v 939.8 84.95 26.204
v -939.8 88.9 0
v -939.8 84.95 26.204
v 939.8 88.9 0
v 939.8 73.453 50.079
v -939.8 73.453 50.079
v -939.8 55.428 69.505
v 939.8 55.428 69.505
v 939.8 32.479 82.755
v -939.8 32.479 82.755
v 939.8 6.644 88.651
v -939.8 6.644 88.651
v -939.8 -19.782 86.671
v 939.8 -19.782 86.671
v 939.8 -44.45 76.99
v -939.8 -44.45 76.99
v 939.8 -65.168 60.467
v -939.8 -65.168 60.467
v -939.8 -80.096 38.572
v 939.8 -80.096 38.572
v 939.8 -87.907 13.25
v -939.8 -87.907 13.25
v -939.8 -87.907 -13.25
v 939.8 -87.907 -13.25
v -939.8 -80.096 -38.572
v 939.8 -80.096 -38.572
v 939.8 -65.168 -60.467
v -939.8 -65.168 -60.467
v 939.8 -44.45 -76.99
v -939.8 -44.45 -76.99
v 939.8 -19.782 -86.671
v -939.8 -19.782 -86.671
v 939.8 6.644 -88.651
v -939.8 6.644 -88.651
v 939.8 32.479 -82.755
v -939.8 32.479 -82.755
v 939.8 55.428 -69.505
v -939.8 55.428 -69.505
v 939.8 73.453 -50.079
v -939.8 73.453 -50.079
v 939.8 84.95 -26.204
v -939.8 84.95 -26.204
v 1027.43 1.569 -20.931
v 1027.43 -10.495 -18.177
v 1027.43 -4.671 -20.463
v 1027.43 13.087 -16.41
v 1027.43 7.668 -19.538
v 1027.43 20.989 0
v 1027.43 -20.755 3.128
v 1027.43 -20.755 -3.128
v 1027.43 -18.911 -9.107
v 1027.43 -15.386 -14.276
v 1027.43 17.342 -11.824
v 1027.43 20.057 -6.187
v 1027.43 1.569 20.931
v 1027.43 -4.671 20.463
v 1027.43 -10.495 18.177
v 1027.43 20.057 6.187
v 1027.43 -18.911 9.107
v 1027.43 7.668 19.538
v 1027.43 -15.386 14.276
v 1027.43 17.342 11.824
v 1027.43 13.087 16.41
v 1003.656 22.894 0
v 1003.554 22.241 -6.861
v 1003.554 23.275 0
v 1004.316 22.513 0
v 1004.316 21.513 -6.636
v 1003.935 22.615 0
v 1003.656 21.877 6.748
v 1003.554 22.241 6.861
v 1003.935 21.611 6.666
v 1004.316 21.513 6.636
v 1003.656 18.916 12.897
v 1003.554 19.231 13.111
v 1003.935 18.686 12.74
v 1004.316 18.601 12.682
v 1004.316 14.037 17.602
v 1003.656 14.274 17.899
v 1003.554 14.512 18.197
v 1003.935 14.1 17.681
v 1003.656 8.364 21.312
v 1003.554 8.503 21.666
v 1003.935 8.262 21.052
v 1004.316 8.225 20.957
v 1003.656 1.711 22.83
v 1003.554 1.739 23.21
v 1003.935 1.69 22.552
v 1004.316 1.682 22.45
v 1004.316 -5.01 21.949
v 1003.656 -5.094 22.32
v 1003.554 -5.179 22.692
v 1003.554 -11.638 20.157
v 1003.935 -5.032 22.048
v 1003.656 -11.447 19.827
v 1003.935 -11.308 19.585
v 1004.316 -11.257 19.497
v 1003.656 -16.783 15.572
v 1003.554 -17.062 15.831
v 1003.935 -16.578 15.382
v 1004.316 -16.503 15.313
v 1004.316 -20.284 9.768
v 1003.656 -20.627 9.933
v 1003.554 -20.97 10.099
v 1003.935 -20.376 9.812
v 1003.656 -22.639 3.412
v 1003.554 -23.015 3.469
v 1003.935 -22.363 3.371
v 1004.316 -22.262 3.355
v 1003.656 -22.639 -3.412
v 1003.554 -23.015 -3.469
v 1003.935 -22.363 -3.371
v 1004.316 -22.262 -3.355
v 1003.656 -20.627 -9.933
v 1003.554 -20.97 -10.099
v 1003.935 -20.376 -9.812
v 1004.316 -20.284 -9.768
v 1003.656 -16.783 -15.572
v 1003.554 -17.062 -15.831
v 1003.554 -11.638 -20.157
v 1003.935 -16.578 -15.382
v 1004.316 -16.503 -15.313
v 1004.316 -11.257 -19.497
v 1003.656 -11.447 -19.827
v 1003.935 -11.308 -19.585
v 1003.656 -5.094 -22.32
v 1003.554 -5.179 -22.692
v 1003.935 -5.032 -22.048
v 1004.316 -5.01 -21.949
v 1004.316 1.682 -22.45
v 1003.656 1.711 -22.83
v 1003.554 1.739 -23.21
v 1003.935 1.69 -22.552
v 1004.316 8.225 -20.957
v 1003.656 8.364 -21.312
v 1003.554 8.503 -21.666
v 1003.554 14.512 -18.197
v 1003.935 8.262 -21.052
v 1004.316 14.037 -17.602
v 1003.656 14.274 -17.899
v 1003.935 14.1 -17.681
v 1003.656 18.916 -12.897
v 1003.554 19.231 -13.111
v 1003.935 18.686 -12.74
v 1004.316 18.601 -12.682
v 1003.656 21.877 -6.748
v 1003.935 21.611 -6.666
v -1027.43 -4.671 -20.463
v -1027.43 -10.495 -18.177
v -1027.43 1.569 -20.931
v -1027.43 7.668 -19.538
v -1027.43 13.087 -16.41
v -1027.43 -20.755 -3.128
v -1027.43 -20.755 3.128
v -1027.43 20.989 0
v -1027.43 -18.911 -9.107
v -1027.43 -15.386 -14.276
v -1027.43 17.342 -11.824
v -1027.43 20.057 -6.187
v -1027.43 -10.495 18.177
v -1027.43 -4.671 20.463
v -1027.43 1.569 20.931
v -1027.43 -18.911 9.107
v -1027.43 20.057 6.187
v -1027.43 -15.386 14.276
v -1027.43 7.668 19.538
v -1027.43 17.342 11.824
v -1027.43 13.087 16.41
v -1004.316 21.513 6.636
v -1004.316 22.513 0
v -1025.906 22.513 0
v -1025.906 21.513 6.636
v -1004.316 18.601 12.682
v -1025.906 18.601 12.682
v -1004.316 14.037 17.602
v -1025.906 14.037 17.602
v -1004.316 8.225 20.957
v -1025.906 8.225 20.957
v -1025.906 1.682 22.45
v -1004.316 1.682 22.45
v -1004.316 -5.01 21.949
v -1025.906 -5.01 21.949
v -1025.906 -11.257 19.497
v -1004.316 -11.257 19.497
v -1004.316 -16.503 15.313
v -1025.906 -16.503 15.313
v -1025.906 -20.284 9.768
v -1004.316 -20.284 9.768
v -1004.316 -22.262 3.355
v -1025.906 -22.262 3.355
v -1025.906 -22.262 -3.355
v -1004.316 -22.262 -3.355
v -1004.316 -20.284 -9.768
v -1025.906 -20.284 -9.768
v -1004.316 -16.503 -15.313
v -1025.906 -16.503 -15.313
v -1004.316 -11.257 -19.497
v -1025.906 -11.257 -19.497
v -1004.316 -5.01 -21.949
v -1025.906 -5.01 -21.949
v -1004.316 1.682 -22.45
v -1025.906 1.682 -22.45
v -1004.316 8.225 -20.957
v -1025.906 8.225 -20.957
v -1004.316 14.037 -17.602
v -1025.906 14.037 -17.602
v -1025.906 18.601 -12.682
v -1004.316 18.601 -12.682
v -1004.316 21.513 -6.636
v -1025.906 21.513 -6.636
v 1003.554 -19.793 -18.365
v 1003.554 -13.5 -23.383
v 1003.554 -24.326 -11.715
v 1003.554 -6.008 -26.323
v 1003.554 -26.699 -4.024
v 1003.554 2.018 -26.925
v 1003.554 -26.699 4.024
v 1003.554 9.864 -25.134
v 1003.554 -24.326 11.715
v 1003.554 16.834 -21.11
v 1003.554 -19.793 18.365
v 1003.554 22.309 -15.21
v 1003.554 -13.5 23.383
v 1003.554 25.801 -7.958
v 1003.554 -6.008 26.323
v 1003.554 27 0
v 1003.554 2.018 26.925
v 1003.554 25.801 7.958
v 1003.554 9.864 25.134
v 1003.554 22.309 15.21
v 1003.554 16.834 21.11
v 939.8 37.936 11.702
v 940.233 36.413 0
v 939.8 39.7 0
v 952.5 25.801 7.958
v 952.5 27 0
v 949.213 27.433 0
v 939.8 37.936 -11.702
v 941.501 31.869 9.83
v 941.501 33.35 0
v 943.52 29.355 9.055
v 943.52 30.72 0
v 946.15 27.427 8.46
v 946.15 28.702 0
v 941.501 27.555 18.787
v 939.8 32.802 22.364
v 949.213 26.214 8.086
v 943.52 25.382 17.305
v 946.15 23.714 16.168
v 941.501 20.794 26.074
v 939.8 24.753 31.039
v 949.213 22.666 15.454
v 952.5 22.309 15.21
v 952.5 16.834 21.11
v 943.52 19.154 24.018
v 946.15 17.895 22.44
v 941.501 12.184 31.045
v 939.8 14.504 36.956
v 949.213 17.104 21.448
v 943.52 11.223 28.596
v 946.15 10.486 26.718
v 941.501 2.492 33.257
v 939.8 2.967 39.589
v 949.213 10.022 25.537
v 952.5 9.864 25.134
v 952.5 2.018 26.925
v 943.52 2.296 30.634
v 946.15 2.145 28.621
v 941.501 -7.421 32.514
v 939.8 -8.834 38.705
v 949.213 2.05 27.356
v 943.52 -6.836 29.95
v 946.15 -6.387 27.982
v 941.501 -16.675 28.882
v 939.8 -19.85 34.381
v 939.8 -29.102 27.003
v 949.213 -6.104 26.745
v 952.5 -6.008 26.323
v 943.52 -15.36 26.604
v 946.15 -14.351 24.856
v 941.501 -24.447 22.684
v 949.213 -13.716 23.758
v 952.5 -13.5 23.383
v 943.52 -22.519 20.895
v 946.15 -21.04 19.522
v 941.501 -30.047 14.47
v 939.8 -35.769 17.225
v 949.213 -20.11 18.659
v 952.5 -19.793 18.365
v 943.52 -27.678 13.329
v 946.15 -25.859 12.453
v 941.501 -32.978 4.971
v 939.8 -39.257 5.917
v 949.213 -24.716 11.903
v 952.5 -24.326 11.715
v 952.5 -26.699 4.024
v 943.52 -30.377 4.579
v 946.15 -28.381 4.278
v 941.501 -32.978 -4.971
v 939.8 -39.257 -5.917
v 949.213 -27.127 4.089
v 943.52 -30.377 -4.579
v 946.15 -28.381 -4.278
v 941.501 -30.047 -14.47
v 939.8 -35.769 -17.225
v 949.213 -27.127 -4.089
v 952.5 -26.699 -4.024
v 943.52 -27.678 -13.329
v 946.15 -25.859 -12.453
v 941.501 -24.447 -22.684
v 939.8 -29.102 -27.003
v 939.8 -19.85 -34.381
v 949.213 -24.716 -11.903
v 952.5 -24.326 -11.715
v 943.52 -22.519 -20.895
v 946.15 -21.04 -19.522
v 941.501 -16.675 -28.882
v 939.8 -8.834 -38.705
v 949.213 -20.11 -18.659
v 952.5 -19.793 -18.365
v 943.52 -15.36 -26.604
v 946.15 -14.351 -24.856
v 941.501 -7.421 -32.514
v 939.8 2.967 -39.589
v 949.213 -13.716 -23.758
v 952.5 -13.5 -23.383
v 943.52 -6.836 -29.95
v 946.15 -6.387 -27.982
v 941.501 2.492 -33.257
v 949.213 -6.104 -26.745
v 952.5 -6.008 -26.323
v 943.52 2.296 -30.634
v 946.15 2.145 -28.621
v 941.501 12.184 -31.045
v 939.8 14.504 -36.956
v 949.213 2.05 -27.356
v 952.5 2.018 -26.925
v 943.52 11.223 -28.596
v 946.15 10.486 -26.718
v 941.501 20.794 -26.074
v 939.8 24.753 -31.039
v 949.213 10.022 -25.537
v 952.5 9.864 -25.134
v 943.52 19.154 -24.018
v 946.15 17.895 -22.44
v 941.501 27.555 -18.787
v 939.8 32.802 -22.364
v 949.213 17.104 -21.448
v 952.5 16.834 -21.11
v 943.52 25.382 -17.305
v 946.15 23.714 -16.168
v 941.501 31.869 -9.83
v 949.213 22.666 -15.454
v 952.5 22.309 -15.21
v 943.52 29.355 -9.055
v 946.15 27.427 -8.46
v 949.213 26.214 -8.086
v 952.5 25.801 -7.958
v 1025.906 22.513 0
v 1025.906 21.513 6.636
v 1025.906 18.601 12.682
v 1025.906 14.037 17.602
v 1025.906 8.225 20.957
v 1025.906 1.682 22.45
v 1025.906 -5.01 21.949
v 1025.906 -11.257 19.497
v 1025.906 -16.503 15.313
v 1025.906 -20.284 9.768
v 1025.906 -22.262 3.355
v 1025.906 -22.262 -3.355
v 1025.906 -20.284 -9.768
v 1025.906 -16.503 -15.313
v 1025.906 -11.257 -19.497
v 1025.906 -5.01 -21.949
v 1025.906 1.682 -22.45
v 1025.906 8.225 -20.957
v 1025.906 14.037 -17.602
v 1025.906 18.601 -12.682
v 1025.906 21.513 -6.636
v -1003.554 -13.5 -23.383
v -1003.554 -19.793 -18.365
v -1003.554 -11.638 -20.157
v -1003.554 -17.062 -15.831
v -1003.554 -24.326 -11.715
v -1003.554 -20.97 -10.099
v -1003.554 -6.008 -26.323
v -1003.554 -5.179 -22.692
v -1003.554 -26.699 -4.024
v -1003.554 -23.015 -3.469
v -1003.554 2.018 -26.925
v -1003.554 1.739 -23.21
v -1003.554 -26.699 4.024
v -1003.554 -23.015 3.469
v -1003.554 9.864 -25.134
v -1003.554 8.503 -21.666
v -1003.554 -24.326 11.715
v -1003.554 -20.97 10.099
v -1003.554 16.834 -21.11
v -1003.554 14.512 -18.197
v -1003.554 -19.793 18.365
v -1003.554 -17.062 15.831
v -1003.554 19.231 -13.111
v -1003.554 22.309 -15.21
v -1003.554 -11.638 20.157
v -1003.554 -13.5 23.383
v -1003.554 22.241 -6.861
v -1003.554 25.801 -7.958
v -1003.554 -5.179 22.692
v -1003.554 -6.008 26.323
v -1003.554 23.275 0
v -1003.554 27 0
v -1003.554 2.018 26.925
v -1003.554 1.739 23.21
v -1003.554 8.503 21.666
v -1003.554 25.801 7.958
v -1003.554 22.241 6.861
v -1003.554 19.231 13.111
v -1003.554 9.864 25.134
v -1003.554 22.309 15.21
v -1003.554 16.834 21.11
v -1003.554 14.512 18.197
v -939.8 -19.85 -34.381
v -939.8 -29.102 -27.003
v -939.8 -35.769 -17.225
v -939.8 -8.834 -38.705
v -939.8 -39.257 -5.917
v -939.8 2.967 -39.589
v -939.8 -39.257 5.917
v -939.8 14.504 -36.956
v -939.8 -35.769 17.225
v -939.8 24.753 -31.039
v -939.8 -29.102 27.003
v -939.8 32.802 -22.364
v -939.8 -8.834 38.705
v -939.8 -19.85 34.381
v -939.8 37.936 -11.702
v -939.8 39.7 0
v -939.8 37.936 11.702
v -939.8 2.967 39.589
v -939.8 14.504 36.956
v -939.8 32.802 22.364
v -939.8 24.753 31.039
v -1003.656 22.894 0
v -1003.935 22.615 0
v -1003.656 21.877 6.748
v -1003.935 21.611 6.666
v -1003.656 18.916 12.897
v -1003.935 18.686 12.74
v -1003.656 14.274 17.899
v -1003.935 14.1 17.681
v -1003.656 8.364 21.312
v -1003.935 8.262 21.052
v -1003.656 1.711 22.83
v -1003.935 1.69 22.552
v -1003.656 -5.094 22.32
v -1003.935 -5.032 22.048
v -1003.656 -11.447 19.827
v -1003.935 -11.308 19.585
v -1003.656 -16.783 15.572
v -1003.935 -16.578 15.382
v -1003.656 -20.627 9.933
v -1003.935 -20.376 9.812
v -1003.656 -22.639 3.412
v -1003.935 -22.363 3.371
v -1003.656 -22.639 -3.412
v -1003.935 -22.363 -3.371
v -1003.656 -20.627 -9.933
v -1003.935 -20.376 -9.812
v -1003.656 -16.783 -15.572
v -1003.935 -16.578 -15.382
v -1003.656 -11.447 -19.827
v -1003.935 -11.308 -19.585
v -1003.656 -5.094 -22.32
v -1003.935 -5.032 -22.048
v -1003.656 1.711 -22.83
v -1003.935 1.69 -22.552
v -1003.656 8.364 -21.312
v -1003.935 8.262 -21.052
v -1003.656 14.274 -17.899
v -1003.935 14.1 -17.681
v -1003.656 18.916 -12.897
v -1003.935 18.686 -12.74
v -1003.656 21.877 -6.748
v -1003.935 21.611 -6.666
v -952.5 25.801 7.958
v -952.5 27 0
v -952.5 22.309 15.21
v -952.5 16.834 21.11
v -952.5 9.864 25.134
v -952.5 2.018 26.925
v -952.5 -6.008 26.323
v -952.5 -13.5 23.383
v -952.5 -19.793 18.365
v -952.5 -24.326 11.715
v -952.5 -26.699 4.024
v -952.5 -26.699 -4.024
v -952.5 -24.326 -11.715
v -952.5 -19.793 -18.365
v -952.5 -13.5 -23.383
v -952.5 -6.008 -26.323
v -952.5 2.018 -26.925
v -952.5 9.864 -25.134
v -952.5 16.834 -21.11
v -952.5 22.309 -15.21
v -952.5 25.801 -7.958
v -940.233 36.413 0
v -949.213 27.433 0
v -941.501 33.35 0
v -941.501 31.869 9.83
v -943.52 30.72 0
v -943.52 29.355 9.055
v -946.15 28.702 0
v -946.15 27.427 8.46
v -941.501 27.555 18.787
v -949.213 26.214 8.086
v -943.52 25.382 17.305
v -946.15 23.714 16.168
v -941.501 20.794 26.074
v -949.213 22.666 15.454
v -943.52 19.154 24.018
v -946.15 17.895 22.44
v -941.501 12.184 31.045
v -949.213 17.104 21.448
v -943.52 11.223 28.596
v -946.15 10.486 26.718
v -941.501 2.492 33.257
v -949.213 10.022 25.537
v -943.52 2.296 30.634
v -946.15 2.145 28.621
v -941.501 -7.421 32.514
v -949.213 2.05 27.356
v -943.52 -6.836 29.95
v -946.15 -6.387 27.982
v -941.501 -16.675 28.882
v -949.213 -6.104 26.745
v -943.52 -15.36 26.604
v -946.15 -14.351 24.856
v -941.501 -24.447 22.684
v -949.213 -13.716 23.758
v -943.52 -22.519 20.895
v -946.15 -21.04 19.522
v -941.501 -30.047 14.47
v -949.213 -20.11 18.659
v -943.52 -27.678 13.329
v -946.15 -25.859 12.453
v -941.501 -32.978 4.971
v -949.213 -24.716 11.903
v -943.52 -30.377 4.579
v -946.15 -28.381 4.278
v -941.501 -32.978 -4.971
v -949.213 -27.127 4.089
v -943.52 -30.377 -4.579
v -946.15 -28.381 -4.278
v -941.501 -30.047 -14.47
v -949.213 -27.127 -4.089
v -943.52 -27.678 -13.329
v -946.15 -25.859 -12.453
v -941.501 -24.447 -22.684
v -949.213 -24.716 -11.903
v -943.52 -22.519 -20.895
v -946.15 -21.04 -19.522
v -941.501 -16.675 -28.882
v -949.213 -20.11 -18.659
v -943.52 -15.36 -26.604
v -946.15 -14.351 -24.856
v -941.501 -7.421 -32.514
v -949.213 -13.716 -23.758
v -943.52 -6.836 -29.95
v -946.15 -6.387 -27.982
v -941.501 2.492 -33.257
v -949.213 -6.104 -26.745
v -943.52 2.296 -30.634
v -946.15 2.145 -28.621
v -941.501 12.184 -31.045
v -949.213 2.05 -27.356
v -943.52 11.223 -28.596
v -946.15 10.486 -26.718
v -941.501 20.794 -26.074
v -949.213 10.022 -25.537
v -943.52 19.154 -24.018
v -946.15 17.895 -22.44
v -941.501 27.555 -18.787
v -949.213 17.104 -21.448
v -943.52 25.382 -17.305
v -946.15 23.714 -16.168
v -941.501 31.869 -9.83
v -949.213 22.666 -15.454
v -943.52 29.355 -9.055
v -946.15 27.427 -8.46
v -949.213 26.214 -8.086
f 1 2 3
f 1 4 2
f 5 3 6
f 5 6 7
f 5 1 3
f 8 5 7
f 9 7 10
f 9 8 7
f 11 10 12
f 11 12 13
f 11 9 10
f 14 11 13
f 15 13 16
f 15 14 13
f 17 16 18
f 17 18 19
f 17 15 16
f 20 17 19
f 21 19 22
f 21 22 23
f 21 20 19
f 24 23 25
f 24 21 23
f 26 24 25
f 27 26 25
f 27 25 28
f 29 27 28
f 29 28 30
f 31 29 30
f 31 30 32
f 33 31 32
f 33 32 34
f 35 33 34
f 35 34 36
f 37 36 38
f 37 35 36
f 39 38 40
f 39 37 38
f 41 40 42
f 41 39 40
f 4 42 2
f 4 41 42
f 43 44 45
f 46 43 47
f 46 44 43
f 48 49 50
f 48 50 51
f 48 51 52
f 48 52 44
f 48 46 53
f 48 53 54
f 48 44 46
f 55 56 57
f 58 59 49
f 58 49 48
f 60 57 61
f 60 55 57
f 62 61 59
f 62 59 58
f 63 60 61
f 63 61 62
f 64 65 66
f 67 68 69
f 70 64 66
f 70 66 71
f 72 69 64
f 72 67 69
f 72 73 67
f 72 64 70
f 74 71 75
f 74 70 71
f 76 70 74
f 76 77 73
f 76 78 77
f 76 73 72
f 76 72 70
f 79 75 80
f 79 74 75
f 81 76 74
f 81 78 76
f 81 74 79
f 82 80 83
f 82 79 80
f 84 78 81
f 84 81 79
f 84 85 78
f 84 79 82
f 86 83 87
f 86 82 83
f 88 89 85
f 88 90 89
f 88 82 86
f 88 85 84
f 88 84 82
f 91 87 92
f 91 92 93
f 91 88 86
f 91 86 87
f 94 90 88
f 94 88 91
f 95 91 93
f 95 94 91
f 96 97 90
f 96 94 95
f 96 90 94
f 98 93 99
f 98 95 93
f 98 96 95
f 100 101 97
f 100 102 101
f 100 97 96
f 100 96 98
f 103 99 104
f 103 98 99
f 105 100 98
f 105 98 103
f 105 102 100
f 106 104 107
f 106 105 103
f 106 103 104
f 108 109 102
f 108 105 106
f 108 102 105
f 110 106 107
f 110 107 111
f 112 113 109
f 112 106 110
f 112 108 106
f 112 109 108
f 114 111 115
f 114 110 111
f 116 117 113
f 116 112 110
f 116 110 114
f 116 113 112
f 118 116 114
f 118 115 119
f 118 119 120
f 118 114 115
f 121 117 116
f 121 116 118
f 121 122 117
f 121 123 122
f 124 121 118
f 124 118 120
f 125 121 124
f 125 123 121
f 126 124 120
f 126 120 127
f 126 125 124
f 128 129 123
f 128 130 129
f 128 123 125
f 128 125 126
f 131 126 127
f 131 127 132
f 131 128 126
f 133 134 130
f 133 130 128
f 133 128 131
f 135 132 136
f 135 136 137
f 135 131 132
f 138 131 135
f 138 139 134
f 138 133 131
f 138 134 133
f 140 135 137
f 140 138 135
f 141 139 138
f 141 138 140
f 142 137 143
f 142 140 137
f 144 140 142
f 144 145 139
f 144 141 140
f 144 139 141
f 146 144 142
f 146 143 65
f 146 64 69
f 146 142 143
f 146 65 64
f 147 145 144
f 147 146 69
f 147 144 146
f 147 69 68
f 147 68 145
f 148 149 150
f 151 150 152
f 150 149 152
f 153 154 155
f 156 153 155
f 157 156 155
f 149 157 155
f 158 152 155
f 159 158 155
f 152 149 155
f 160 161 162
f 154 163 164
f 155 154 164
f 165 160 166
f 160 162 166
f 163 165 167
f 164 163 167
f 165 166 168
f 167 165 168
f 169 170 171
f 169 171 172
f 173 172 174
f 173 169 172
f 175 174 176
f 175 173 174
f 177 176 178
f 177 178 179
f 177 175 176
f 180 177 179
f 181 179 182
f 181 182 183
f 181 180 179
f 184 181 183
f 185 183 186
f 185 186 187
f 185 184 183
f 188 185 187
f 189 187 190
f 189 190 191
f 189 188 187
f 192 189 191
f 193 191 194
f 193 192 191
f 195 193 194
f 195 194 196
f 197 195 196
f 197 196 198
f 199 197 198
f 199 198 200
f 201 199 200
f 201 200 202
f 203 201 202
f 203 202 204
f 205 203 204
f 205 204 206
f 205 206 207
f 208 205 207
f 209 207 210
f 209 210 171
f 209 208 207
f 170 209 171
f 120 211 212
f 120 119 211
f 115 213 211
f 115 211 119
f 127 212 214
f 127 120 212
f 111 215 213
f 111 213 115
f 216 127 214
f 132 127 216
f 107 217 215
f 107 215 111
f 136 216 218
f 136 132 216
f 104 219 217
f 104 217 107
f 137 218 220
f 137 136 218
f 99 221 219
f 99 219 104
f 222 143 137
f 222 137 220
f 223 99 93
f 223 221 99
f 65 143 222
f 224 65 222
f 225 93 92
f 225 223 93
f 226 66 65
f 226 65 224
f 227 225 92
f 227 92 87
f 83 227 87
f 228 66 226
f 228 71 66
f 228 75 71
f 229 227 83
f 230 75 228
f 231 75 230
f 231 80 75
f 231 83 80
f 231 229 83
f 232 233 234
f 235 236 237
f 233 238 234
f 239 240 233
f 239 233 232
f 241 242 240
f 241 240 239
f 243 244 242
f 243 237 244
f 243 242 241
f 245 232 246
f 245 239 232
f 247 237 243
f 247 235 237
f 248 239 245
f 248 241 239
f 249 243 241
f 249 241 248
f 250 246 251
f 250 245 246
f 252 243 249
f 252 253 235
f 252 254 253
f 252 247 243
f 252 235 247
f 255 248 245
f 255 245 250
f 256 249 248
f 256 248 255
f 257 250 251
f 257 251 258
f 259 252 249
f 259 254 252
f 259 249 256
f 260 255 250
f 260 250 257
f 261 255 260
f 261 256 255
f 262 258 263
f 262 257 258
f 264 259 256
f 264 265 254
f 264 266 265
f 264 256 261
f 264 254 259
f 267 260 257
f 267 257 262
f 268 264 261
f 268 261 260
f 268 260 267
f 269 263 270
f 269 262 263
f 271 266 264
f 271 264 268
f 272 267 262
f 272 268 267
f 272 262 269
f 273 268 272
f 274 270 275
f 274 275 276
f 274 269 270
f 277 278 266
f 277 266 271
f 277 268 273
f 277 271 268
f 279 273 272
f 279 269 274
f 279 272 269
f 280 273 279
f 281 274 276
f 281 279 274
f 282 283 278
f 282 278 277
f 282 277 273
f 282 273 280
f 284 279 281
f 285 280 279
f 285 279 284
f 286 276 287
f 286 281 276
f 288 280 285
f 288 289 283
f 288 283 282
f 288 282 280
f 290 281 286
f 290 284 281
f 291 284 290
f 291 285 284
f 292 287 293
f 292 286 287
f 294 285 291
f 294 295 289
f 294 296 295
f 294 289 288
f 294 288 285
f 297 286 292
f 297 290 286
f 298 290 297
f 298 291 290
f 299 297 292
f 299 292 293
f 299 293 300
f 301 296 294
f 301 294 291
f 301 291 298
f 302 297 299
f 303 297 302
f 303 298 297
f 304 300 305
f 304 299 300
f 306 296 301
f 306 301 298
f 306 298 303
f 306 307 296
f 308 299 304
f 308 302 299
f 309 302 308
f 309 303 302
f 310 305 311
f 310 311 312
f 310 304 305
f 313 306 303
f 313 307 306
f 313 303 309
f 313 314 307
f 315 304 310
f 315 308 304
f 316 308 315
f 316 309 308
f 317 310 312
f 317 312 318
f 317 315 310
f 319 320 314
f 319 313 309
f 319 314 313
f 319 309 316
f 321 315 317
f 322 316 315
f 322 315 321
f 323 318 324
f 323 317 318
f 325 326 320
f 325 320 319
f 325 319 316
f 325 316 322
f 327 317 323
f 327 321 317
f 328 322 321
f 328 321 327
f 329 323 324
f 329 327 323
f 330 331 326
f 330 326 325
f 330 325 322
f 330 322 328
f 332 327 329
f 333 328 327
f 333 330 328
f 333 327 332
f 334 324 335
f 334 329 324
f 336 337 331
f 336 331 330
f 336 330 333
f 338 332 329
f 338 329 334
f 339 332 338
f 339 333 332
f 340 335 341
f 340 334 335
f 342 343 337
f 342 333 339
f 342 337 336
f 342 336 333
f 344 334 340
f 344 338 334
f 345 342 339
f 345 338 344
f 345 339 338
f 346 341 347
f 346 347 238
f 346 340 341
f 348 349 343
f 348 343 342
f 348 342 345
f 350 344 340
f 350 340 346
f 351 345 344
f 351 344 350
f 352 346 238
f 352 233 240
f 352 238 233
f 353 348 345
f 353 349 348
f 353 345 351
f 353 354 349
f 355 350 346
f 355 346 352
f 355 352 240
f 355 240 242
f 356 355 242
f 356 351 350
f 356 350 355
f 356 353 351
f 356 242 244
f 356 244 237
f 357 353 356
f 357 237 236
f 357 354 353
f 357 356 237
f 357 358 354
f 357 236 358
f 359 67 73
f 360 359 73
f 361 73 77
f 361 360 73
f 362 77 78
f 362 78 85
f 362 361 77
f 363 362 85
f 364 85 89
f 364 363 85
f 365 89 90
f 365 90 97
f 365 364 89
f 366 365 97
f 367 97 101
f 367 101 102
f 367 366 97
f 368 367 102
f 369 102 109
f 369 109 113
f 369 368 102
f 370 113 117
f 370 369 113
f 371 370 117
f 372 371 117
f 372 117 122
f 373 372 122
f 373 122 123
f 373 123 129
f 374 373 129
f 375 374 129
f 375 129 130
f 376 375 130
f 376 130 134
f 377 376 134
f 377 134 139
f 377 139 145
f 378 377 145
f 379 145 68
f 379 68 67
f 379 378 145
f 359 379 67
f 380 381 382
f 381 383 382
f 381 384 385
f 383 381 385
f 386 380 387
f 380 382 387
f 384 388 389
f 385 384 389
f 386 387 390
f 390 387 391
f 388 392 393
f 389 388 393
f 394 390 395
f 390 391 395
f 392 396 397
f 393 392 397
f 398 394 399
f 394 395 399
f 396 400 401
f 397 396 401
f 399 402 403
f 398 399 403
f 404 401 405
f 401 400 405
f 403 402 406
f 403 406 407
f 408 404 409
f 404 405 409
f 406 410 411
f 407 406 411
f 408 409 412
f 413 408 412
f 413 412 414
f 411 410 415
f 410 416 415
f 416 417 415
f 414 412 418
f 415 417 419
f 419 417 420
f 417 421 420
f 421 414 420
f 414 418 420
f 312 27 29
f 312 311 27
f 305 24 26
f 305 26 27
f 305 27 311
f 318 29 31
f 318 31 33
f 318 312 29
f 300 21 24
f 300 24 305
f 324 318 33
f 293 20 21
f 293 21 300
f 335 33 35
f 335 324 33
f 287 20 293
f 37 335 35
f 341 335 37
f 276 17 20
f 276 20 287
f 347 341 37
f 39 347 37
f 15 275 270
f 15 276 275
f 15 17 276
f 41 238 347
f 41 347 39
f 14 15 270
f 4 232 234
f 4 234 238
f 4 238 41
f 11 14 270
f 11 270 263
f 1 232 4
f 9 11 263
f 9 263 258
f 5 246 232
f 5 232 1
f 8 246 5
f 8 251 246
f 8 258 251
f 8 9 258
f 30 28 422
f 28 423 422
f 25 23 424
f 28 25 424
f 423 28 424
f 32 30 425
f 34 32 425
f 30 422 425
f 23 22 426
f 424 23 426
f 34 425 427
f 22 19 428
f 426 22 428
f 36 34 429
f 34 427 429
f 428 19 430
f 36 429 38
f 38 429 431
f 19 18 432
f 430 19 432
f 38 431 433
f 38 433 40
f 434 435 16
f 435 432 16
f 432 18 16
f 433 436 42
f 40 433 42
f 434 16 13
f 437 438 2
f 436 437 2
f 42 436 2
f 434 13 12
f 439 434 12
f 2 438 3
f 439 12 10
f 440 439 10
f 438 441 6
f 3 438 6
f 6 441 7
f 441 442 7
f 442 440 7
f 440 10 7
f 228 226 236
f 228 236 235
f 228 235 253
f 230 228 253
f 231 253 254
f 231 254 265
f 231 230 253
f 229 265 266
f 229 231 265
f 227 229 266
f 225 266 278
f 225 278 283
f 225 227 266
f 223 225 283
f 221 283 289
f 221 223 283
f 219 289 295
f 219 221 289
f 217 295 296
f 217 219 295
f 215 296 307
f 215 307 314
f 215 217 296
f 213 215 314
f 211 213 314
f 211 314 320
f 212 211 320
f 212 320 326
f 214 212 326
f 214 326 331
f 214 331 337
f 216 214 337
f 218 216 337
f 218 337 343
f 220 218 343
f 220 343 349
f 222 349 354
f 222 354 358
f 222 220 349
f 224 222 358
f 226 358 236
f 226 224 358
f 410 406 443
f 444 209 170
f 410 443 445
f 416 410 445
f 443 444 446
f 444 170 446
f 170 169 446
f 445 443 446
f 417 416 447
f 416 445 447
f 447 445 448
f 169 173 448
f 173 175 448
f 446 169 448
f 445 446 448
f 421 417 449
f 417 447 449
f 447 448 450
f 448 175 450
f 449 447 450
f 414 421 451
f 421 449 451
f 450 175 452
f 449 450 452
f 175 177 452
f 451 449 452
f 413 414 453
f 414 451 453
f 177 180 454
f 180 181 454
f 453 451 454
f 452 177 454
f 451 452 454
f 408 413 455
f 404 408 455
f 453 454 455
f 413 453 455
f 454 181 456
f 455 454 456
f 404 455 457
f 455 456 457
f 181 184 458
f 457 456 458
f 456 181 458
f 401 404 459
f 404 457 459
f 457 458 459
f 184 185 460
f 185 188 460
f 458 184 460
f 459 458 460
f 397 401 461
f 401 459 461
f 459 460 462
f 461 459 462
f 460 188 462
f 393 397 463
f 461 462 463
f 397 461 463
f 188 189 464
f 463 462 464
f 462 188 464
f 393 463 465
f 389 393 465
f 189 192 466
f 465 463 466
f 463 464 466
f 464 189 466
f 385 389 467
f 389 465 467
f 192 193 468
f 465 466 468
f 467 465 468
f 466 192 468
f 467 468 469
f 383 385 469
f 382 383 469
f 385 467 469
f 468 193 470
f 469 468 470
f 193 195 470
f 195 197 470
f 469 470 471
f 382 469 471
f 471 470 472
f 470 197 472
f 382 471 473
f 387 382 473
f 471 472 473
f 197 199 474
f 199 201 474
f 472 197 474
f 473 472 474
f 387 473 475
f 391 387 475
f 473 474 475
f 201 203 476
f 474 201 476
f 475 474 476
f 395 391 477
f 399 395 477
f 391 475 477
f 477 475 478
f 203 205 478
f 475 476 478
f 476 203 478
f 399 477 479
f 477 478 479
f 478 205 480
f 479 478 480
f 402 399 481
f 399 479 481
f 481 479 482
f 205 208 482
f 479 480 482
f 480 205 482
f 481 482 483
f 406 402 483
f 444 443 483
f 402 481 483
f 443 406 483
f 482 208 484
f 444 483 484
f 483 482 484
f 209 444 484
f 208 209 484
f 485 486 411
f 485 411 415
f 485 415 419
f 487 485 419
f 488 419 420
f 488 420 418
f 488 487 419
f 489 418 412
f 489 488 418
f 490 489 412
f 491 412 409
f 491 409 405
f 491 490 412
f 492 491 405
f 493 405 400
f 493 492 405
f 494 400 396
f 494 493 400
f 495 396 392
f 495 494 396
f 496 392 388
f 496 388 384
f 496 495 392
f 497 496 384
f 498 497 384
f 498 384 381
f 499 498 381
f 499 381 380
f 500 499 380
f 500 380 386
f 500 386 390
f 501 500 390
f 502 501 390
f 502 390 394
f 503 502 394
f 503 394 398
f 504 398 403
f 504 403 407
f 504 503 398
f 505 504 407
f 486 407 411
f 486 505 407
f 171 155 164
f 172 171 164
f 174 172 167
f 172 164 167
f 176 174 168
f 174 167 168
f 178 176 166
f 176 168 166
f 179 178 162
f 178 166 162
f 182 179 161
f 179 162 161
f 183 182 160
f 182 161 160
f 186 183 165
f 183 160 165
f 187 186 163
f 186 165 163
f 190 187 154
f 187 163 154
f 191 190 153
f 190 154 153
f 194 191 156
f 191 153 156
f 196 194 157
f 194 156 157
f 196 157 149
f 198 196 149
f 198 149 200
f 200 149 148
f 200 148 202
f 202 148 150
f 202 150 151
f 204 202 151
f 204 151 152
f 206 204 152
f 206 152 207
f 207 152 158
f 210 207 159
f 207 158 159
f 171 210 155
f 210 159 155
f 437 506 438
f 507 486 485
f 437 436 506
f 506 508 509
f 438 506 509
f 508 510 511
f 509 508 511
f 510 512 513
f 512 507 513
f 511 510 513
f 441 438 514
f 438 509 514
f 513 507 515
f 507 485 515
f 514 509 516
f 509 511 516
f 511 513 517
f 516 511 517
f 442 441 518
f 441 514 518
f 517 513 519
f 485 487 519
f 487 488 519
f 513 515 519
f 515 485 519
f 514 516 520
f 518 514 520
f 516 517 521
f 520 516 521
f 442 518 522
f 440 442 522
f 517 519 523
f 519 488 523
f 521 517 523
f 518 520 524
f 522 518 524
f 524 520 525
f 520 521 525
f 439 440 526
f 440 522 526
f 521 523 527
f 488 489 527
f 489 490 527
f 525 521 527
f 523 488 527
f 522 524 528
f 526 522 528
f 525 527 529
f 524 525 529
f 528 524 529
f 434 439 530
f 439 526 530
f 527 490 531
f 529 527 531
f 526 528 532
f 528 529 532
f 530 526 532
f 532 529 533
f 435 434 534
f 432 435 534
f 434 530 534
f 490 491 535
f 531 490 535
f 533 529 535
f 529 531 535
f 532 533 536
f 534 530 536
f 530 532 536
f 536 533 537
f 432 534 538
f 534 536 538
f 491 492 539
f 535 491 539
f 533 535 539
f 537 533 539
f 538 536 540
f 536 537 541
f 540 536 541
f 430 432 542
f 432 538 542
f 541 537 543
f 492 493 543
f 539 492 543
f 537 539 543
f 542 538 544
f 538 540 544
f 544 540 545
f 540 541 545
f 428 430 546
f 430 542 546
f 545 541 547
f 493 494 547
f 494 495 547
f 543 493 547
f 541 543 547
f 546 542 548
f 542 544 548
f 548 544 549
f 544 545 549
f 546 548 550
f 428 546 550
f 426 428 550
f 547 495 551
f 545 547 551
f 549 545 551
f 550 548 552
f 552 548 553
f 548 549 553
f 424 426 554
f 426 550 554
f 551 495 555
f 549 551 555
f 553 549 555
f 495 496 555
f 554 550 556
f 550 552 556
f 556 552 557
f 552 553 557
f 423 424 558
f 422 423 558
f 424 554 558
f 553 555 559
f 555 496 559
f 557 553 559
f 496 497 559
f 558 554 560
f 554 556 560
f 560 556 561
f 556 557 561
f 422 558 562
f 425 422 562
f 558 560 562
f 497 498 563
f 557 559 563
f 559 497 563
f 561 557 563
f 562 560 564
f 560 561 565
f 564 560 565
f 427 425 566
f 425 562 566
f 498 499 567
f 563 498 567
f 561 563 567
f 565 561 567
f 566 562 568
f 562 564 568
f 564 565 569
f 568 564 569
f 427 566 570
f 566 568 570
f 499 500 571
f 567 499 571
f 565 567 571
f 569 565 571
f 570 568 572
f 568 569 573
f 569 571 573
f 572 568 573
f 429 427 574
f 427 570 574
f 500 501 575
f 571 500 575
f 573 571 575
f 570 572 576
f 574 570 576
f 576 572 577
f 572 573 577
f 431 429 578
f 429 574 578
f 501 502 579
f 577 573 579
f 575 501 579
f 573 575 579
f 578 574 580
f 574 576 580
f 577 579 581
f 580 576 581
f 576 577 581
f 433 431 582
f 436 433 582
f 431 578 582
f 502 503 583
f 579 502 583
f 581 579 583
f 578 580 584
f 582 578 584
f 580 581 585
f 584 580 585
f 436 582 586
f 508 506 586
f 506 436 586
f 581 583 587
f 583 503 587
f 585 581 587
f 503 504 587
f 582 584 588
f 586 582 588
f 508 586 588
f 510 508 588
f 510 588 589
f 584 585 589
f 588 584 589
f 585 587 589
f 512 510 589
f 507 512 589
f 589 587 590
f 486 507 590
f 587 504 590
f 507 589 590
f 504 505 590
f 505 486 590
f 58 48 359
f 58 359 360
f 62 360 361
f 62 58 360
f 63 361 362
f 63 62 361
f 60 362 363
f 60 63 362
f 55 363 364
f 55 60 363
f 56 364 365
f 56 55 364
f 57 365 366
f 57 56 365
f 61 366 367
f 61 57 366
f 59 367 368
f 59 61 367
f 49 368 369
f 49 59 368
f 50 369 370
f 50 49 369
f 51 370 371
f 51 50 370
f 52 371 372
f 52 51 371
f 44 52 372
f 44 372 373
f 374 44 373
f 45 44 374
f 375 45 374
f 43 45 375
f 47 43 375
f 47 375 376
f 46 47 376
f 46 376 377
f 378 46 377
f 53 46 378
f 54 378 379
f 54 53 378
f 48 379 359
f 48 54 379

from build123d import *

# Parameters (mm, degrees)
F0_R     = 22.51329
F1_DEPTH = 1027.43
F2_R     = 27.0002
F3_DEPTH = 1003.554
F4_R     = 88.9
F5_DEPTH = 939.8
F6_R     = 12.7
F7_R     = 0.762
F8_R     = 0.762
F9_SIZE  = 1.524


with BuildPart() as f1:
    # F0 (on Right) → F1 (new body, symmetric)
    with BuildSketch(Plane.YZ):
        Circle(F0_R)
    extrude(amount=F1_DEPTH, both=True)

    # F2 (on Right) → F3 (join, symmetric)
    with BuildSketch(Plane.YZ):
        Circle(F2_R)
    extrude(amount=F3_DEPTH, both=True)

    # F4 (on Right) → F5 (join, symmetric)
    with BuildSketch(Plane.YZ):
        Circle(F4_R)
    extrude(amount=F5_DEPTH, both=True)

    # F6
    f6_edges = [f1.edges().sort_by_distance(p)[0] for p in [
        (939.8, -27.0002, 0),
        (-939.8, -27.0002, 0),
    ]]
    fillet(f6_edges, radius=F6_R)

    # F7
    f7_edges = [f1.edges().sort_by_distance(p)[0] for p in [
        (-1003.554, -22.51329, 0),
    ]]
    fillet(f7_edges, radius=F7_R)

    # F8
    f8_edges = [f1.edges().sort_by_distance(p)[0] for p in [
        (1003.554, -22.51329, 0),
    ]]
    fillet(f8_edges, radius=F8_R)

    # F9
    f9_edges = [f1.edges().sort_by_distance(p)[0] for p in [
        (1027.43, -22.51329, 0),
        (-1027.43, -22.51329, 0),
    ]]
    chamfer(f9_edges, length=F9_SIZE)


solid = f1.part
